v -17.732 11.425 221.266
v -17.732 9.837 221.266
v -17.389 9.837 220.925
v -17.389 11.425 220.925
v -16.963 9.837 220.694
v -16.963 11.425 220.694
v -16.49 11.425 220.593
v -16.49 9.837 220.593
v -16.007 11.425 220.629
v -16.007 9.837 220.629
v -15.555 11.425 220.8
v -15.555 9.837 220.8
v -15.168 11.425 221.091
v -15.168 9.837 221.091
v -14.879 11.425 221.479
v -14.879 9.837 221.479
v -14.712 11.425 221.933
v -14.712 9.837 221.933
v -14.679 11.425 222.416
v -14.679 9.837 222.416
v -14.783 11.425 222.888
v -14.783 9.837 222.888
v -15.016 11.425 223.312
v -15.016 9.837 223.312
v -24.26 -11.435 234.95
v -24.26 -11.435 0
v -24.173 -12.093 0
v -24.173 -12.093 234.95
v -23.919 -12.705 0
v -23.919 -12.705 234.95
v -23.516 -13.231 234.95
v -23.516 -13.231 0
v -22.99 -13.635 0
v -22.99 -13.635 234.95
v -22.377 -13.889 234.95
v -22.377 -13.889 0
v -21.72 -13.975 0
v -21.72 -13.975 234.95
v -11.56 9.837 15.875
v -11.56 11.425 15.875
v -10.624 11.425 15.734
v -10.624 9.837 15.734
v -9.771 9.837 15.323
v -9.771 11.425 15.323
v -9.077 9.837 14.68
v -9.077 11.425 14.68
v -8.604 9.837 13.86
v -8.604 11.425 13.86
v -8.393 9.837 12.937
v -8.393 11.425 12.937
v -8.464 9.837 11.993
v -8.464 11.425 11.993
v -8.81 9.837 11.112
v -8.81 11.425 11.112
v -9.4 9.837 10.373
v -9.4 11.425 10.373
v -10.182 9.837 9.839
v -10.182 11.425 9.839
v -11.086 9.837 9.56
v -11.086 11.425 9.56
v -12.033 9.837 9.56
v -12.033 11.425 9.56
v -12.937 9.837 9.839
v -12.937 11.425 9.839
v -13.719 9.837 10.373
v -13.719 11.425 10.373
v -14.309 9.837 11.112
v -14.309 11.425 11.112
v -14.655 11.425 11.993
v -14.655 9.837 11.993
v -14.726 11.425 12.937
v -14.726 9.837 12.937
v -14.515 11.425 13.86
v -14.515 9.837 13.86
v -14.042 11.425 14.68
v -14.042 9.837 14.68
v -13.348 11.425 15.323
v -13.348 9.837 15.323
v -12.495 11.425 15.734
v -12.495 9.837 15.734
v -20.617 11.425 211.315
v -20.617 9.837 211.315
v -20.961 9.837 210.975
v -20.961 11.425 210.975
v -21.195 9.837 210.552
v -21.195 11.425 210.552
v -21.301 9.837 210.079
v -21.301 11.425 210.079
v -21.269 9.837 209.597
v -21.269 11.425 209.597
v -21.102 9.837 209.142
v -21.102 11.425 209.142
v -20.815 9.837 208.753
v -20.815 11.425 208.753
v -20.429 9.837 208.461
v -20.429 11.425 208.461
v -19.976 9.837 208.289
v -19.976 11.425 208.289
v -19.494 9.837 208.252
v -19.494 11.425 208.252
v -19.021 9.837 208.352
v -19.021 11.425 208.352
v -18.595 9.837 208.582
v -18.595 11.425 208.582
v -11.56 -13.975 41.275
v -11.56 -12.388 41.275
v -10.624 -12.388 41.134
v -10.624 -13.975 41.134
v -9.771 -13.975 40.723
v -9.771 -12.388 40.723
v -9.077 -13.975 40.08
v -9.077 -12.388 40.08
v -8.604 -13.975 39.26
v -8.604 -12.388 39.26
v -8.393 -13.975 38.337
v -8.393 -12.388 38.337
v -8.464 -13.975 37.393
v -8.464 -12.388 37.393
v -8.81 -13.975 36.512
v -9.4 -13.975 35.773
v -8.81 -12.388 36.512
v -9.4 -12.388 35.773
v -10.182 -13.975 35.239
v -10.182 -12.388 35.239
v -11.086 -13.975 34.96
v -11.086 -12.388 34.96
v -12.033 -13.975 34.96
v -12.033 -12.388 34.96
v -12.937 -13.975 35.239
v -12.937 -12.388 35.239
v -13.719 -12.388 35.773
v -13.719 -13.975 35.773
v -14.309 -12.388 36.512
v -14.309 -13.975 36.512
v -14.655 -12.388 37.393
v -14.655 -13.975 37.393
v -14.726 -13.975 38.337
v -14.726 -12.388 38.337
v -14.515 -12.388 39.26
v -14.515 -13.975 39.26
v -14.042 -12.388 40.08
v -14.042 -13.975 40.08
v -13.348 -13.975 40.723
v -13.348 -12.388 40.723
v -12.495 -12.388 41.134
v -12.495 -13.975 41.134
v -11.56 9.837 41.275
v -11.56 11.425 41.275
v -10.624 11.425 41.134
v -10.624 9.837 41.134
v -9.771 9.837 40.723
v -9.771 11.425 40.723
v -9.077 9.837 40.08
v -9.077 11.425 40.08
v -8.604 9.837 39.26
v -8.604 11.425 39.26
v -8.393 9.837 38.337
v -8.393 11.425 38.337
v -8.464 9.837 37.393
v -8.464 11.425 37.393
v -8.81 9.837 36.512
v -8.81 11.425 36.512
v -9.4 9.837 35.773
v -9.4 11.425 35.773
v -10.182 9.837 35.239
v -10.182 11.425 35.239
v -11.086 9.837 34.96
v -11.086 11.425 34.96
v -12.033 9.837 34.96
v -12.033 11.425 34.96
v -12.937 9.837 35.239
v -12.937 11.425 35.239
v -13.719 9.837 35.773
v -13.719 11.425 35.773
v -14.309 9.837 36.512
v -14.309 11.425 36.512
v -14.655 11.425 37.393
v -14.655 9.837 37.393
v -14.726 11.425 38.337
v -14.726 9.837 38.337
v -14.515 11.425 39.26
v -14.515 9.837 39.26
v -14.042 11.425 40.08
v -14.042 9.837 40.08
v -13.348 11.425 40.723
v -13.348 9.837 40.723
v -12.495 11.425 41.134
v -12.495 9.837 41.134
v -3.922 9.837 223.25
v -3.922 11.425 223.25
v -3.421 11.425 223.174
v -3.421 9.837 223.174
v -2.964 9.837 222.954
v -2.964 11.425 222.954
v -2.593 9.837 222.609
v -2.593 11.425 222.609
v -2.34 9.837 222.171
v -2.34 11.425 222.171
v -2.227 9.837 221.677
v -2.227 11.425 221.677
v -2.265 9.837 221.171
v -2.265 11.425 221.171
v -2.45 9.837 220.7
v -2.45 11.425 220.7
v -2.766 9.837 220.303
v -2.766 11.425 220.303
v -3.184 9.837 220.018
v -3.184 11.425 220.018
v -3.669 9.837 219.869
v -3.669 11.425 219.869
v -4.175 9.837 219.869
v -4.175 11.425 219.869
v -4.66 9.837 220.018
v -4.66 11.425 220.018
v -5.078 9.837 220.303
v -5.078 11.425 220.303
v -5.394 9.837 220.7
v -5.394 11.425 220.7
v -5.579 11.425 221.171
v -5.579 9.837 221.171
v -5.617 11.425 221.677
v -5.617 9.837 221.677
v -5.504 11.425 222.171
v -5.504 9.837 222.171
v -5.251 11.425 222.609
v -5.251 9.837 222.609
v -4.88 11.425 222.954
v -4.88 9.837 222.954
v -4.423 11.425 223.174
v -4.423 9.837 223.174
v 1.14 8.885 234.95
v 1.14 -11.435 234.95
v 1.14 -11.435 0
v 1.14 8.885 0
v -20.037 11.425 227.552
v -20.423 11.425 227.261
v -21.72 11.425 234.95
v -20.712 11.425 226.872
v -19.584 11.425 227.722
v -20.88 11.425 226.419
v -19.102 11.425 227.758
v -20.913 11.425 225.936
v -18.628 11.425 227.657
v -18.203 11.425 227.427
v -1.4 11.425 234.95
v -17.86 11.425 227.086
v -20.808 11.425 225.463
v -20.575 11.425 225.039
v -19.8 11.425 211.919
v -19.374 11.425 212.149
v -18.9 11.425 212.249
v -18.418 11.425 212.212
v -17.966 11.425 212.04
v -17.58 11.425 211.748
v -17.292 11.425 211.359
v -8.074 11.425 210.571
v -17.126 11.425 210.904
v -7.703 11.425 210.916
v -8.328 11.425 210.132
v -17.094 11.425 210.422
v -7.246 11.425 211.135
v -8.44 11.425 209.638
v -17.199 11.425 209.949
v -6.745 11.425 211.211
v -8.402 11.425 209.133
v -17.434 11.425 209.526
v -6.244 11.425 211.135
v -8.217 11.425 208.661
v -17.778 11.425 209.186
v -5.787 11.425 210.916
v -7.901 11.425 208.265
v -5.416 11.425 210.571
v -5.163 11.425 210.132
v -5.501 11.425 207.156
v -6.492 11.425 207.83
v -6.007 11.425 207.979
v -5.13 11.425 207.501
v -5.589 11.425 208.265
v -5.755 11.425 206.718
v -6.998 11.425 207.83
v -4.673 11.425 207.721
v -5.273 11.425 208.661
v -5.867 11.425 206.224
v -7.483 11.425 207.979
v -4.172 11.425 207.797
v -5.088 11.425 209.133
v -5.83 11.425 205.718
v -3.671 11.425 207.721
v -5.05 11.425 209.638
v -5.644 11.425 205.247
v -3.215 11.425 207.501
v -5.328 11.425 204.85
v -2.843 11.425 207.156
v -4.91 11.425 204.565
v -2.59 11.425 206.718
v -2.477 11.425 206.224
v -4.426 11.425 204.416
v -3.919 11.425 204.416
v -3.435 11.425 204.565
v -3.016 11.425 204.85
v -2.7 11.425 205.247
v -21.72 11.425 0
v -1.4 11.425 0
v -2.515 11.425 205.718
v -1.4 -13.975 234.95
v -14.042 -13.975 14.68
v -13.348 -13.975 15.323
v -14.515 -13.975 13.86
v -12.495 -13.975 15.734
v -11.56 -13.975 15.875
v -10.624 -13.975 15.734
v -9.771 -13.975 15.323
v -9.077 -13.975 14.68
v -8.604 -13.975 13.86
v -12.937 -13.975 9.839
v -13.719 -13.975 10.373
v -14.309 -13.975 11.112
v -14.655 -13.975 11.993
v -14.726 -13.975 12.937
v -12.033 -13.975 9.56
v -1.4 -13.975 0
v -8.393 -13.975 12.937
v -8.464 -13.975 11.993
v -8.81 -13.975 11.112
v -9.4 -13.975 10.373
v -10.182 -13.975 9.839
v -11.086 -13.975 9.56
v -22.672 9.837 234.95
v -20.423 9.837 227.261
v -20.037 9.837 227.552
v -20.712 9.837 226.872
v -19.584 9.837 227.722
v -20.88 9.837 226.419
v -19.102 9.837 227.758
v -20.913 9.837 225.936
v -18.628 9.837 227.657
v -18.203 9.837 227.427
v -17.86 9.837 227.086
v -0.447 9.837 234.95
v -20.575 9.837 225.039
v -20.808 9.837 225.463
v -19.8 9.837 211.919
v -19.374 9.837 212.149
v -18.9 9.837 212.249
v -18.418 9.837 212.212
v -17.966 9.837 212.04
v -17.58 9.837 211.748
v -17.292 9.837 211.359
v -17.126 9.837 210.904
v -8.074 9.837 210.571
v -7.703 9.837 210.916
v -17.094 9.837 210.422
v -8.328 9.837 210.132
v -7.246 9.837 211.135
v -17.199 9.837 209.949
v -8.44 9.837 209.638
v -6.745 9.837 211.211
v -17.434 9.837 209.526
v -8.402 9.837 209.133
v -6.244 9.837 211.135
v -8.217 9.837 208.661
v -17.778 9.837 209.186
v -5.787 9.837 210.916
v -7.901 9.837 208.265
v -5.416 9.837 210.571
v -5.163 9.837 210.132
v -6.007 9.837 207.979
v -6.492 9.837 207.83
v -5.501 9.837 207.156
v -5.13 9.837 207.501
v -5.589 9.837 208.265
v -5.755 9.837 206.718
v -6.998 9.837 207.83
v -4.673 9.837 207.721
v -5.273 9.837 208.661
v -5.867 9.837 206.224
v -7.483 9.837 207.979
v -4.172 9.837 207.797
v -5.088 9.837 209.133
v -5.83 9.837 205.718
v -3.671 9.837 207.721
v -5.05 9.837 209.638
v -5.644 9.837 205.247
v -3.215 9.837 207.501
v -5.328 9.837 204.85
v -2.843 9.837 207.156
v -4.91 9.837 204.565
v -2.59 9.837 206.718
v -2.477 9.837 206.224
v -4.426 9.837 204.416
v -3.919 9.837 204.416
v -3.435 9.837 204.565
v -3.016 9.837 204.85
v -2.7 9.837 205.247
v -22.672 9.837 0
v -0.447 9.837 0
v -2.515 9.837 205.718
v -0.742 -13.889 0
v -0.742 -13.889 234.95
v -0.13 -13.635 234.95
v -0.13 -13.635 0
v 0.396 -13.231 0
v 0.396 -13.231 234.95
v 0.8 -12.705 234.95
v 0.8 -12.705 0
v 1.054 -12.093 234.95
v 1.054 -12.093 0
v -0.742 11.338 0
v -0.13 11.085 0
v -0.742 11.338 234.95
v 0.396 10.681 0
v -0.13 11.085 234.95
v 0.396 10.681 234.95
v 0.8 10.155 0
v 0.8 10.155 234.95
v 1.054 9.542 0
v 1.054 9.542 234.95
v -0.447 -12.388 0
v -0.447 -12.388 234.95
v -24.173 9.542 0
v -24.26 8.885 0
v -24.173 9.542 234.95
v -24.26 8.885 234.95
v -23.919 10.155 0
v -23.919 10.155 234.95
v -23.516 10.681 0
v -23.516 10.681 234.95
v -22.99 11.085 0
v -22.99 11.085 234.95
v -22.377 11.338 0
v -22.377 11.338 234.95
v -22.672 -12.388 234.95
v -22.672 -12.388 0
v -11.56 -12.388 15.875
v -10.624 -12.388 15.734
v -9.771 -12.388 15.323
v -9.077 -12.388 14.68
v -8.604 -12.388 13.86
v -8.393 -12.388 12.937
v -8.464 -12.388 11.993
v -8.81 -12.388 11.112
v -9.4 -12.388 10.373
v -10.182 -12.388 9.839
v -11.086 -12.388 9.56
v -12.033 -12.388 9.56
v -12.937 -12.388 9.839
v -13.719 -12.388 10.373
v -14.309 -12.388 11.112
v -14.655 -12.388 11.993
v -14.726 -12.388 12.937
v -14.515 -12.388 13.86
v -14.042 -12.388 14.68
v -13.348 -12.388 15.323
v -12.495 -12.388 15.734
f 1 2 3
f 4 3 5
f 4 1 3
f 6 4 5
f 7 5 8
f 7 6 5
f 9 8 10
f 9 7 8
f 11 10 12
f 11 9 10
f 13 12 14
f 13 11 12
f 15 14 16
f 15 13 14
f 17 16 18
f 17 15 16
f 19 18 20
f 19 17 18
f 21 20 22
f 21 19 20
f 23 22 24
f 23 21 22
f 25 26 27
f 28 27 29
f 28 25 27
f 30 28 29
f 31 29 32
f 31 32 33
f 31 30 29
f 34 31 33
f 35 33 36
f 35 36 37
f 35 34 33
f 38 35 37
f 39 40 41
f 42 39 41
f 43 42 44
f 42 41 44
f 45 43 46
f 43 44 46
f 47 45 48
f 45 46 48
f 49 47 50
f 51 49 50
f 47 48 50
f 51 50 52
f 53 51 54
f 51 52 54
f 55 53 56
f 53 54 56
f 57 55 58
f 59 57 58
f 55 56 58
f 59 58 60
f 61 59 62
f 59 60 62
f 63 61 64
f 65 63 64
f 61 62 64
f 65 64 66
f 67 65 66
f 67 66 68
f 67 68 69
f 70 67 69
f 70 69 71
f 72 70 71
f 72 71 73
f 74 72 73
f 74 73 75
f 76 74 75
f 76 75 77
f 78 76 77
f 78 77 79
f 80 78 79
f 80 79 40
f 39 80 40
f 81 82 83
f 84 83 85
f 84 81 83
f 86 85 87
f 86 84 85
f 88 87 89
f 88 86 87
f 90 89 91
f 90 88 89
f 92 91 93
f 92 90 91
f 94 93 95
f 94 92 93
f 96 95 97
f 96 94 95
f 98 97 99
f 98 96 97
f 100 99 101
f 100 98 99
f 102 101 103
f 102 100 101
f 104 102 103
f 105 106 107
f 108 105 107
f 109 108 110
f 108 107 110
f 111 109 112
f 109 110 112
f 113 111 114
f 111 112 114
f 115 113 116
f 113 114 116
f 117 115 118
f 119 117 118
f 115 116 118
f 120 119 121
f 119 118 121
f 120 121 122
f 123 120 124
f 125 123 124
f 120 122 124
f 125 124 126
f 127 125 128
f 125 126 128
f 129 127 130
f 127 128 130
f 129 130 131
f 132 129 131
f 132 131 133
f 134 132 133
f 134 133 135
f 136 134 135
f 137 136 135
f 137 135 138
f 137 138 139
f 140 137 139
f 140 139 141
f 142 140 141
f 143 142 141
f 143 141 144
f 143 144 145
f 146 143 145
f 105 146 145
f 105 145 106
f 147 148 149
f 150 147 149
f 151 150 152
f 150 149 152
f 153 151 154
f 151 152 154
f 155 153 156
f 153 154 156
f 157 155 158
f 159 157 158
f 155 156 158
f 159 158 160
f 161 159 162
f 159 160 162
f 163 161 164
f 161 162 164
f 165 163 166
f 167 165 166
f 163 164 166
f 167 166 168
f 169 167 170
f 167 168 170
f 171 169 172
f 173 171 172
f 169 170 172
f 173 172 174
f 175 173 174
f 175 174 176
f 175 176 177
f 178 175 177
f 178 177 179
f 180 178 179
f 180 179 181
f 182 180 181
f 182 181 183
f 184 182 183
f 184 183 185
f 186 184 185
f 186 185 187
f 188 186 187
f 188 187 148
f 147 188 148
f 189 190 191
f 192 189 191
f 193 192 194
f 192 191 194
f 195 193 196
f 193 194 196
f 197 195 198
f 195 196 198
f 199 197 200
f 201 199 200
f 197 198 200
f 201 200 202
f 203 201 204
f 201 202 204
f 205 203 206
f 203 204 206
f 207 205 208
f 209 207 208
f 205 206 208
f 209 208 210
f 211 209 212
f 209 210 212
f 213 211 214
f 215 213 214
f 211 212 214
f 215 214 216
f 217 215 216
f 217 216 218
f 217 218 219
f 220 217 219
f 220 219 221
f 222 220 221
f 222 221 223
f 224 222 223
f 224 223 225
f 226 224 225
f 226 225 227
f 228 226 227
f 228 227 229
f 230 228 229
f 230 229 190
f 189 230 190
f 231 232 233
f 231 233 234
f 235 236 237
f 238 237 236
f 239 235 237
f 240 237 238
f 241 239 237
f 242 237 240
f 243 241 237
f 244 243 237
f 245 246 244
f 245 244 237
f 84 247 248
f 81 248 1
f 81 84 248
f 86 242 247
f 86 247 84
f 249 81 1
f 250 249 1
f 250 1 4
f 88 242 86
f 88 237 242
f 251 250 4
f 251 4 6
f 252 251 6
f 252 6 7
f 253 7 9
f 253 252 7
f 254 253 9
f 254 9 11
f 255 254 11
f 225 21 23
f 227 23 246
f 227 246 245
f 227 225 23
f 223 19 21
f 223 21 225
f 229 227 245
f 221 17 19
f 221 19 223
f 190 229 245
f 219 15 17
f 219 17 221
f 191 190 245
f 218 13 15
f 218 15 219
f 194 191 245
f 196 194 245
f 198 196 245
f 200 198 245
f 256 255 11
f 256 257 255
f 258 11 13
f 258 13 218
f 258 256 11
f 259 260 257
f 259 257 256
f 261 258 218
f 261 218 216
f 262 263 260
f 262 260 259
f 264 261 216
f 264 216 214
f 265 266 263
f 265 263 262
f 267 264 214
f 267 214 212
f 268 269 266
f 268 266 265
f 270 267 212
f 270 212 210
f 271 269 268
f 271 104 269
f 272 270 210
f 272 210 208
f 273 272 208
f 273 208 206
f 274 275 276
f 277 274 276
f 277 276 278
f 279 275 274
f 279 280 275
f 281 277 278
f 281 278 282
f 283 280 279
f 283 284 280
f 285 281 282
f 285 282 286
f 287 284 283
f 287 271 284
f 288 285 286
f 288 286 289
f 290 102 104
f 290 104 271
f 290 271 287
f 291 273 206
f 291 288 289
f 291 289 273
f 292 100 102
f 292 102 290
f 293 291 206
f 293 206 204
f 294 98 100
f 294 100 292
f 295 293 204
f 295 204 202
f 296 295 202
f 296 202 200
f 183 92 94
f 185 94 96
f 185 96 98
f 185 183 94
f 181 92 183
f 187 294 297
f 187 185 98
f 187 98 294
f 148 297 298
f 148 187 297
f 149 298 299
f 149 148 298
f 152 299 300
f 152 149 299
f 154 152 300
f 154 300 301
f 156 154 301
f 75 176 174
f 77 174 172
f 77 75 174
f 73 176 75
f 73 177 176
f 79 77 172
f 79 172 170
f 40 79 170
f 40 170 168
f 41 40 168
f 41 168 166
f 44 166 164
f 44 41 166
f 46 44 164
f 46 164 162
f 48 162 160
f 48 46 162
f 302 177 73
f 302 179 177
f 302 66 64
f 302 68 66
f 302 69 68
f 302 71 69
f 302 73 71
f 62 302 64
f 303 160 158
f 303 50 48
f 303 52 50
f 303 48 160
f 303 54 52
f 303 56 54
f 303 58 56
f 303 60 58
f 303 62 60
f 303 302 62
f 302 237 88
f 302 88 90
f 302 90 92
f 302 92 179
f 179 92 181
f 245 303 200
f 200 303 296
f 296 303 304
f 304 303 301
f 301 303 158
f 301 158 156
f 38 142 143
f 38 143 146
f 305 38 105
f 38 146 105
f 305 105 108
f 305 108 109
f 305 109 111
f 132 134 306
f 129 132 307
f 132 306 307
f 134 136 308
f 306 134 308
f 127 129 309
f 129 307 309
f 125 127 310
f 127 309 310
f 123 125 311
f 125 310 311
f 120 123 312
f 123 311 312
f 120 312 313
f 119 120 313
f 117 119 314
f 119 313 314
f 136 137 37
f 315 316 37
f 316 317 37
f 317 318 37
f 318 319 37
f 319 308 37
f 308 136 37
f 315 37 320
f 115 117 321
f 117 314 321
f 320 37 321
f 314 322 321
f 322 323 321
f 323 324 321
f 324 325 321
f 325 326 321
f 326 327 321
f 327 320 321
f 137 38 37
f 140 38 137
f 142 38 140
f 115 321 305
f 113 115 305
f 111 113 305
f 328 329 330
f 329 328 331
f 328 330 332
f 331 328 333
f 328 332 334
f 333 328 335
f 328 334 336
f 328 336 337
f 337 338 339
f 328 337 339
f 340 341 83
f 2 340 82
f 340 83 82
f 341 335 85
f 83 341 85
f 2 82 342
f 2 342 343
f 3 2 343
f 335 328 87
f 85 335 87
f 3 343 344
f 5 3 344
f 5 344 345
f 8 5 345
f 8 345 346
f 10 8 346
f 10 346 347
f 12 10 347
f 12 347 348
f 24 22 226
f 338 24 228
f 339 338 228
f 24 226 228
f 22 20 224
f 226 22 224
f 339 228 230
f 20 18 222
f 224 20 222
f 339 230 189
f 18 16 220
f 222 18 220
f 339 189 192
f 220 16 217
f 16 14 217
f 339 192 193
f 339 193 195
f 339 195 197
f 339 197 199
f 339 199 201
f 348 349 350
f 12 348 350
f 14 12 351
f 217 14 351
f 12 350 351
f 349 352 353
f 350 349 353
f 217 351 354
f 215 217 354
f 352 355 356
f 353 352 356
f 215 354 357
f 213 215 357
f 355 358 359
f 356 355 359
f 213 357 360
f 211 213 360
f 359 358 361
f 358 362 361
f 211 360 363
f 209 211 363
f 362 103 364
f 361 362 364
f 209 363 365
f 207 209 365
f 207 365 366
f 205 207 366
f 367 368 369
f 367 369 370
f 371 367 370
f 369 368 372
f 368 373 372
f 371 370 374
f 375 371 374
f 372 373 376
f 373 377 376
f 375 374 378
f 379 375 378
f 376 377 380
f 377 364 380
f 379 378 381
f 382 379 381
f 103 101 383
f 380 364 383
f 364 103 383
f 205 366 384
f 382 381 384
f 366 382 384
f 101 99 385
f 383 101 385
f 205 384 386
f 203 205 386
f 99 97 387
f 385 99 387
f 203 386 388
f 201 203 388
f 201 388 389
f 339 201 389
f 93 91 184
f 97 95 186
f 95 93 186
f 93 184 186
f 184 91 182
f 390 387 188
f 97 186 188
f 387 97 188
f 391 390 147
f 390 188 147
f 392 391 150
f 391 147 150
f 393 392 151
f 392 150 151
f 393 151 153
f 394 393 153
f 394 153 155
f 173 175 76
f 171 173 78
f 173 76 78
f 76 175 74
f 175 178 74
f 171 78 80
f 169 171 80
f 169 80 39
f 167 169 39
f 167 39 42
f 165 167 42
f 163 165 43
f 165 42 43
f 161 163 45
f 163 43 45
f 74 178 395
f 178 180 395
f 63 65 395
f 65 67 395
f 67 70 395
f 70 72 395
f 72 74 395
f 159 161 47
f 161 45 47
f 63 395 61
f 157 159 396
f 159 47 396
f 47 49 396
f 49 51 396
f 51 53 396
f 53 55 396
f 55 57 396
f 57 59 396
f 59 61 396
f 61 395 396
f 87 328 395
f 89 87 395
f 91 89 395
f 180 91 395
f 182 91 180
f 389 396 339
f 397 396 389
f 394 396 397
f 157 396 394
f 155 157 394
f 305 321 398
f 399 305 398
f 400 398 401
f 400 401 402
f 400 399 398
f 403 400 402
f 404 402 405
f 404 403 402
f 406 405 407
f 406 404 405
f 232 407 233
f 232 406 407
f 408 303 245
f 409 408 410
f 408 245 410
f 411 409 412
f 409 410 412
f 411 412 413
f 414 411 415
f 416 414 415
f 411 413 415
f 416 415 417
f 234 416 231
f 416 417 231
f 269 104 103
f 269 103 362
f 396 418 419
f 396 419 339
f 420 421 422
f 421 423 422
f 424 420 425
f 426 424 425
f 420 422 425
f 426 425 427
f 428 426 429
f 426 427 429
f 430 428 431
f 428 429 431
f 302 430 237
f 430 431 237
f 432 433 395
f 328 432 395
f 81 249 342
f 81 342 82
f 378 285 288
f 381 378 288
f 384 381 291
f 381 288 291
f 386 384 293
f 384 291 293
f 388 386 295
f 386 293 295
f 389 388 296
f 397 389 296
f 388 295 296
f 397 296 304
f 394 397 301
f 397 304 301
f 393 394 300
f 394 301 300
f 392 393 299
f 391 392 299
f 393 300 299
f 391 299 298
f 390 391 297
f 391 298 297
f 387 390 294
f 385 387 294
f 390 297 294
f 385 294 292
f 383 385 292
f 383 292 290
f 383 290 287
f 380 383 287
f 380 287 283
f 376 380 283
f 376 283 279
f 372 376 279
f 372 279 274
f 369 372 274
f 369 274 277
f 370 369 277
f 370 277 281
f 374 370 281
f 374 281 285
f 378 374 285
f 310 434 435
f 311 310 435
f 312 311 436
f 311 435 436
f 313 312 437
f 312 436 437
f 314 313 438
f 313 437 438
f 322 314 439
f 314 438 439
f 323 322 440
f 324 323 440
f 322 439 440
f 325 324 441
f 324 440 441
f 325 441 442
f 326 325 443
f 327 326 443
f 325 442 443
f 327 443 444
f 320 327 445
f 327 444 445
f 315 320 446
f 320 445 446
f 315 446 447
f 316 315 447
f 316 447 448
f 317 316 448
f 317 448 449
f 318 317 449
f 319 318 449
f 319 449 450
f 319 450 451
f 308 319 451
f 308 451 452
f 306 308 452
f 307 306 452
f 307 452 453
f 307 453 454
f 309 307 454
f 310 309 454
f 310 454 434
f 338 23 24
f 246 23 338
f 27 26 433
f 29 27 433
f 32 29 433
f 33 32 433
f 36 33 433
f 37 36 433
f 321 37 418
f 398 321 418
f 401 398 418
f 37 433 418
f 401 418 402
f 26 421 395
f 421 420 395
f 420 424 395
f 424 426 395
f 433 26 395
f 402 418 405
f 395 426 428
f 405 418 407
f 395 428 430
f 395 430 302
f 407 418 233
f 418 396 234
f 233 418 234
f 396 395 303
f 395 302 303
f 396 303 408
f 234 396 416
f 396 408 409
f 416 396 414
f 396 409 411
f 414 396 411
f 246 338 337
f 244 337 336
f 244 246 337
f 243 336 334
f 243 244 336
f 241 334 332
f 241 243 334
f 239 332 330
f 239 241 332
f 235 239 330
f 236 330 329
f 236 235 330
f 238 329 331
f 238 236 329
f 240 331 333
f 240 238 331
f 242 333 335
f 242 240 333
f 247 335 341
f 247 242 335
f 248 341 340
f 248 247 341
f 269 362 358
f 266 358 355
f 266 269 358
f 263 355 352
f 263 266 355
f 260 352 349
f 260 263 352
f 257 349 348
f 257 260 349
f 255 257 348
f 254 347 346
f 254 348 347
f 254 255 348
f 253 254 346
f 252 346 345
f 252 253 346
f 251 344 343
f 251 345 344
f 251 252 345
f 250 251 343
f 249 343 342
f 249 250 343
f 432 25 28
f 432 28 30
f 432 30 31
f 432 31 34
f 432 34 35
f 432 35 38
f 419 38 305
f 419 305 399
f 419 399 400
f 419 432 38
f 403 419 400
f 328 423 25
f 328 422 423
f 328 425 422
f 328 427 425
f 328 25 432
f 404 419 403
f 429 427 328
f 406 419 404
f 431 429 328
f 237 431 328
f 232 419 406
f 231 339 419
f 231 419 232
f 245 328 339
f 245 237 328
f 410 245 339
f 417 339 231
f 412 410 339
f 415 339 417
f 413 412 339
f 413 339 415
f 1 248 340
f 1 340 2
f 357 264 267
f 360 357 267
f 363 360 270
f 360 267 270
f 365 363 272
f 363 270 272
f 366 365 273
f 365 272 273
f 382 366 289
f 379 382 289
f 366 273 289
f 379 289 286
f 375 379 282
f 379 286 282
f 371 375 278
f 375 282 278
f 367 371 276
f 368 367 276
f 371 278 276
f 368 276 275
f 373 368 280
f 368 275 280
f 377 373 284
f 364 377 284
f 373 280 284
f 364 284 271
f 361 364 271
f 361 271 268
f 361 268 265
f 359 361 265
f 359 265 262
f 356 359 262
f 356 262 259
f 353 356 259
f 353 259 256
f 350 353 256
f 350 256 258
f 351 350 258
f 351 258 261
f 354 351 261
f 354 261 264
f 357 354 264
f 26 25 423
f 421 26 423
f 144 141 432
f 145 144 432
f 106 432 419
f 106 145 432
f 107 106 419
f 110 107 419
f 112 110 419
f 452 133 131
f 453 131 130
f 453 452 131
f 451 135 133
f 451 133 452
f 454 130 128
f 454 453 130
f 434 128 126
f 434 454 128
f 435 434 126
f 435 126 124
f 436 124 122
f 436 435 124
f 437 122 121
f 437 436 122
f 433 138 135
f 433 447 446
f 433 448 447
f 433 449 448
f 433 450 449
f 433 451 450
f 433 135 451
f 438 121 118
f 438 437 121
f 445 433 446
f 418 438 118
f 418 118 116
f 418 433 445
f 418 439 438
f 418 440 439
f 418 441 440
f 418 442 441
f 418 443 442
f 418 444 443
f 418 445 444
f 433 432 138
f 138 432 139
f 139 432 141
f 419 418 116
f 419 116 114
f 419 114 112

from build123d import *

# Parameters (mm, degrees)
SKETCH1_W           = 25.4
SKETCH1_H           = 25.4
SKETCH1_W_2         = 22.225
SKETCH1_H_2         = 22.225
BOSS_EXTRUDE1_DEPTH = 234.95
FILLET1_R           = 2.54
SKETCH2_R           = 3.175
CUT_EXTRUDE1_DEPTH  = 238.560919126
SKETCH3_R           = 1.7
CUT_EXTRUDE2_DEPTH  = 2.54


with BuildPart() as part:
    # Sketch1 → Boss-Extrude1 (new body)
    with BuildSketch(Plane.XY):
        with Locations((-11.559591837, -1.275183673)):
            Rectangle(SKETCH1_W, SKETCH1_H)
        with Locations((-11.559591837, -1.275183673)):
            Rectangle(SKETCH1_W_2, SKETCH1_H_2, mode=Mode.SUBTRACT)
    extrude(amount=BOSS_EXTRUDE1_DEPTH)

    # Fillet1
    fillet1_edges = [part.edges().sort_by_distance(p)[0] for p in [
        (-24.259591837, 11.424816327, 117.475),
        (1.140408163, 11.424816327, 117.475),
        (1.140408163, -13.975183673, 117.475),
        (-24.259591837, -13.975183673, 117.475),
    ]]
    fillet(fillet1_edges, radius=FILLET1_R)

    # Sketch2 → Cut-Extrude1 (cut, through all)
    with BuildSketch(Plane(origin=(0, 11.424816327, 0), x_dir=(1, 0, 0), z_dir=(0, 1, 0))):
        with Locations(Location((-11.559591837, -12.7, 0), (0, 0, 270))):
            Circle(SKETCH2_R)
        with Locations(Location((-11.559591837, -38.1, 0), (0, 0, 270))):
            Circle(SKETCH2_R)
    extrude(amount=-CUT_EXTRUDE1_DEPTH, mode=Mode.SUBTRACT)

    # Sketch3 → Cut-Extrude2 (cut)
    with BuildSketch(Plane(origin=(0, 11.424816327, 0), x_dir=(1, 0, 0), z_dir=(0, 1, 0))):
        with Locations(Location((-6.745071652, -209.51091592, 0), (0, 0, 270))):
            Circle(SKETCH3_R)
        with Locations(Location((-4.172146269, -206.096528614, 0), (0, 0, 270))):
            Circle(SKETCH3_R)
        with Locations(Location((-3.921994623, -221.549522883, 0), (0, 0, 270))):
            Circle(SKETCH3_R)
        with BuildLine():
            Line((-15.016431655, -223.31216962), (-17.859841481, -227.085501905))
            ThreePointArc((-17.859841481, -227.085501905), (-20.240607387, -227.420096733), (-20.575202215, -225.039330826))
            Line((-20.575202215, -225.039330826), (-17.731792389, -221.265998541))
            ThreePointArc((-17.731792389, -221.265998541), (-15.351026483, -220.931403713), (-15.016431655, -223.31216962))
        make_face()
        with BuildLine():
            Line((-18.594632259, -208.581648392), (-17.777811336, -209.185849998))
            ThreePointArc((-17.777811336, -209.185849998), (-17.422050667, -211.563545173), (-19.799745842, -211.919305842))
            Line((-19.799745842, -211.919305842), (-20.616566765, -211.315104237))
            ThreePointArc((-20.616566765, -211.315104237), (-20.972327435, -208.937409062), (-18.594632259, -208.581648392))
        make_face()
    extrude(amount=-CUT_EXTRUDE2_DEPTH, mode=Mode.SUBTRACT)


solid = part.part
